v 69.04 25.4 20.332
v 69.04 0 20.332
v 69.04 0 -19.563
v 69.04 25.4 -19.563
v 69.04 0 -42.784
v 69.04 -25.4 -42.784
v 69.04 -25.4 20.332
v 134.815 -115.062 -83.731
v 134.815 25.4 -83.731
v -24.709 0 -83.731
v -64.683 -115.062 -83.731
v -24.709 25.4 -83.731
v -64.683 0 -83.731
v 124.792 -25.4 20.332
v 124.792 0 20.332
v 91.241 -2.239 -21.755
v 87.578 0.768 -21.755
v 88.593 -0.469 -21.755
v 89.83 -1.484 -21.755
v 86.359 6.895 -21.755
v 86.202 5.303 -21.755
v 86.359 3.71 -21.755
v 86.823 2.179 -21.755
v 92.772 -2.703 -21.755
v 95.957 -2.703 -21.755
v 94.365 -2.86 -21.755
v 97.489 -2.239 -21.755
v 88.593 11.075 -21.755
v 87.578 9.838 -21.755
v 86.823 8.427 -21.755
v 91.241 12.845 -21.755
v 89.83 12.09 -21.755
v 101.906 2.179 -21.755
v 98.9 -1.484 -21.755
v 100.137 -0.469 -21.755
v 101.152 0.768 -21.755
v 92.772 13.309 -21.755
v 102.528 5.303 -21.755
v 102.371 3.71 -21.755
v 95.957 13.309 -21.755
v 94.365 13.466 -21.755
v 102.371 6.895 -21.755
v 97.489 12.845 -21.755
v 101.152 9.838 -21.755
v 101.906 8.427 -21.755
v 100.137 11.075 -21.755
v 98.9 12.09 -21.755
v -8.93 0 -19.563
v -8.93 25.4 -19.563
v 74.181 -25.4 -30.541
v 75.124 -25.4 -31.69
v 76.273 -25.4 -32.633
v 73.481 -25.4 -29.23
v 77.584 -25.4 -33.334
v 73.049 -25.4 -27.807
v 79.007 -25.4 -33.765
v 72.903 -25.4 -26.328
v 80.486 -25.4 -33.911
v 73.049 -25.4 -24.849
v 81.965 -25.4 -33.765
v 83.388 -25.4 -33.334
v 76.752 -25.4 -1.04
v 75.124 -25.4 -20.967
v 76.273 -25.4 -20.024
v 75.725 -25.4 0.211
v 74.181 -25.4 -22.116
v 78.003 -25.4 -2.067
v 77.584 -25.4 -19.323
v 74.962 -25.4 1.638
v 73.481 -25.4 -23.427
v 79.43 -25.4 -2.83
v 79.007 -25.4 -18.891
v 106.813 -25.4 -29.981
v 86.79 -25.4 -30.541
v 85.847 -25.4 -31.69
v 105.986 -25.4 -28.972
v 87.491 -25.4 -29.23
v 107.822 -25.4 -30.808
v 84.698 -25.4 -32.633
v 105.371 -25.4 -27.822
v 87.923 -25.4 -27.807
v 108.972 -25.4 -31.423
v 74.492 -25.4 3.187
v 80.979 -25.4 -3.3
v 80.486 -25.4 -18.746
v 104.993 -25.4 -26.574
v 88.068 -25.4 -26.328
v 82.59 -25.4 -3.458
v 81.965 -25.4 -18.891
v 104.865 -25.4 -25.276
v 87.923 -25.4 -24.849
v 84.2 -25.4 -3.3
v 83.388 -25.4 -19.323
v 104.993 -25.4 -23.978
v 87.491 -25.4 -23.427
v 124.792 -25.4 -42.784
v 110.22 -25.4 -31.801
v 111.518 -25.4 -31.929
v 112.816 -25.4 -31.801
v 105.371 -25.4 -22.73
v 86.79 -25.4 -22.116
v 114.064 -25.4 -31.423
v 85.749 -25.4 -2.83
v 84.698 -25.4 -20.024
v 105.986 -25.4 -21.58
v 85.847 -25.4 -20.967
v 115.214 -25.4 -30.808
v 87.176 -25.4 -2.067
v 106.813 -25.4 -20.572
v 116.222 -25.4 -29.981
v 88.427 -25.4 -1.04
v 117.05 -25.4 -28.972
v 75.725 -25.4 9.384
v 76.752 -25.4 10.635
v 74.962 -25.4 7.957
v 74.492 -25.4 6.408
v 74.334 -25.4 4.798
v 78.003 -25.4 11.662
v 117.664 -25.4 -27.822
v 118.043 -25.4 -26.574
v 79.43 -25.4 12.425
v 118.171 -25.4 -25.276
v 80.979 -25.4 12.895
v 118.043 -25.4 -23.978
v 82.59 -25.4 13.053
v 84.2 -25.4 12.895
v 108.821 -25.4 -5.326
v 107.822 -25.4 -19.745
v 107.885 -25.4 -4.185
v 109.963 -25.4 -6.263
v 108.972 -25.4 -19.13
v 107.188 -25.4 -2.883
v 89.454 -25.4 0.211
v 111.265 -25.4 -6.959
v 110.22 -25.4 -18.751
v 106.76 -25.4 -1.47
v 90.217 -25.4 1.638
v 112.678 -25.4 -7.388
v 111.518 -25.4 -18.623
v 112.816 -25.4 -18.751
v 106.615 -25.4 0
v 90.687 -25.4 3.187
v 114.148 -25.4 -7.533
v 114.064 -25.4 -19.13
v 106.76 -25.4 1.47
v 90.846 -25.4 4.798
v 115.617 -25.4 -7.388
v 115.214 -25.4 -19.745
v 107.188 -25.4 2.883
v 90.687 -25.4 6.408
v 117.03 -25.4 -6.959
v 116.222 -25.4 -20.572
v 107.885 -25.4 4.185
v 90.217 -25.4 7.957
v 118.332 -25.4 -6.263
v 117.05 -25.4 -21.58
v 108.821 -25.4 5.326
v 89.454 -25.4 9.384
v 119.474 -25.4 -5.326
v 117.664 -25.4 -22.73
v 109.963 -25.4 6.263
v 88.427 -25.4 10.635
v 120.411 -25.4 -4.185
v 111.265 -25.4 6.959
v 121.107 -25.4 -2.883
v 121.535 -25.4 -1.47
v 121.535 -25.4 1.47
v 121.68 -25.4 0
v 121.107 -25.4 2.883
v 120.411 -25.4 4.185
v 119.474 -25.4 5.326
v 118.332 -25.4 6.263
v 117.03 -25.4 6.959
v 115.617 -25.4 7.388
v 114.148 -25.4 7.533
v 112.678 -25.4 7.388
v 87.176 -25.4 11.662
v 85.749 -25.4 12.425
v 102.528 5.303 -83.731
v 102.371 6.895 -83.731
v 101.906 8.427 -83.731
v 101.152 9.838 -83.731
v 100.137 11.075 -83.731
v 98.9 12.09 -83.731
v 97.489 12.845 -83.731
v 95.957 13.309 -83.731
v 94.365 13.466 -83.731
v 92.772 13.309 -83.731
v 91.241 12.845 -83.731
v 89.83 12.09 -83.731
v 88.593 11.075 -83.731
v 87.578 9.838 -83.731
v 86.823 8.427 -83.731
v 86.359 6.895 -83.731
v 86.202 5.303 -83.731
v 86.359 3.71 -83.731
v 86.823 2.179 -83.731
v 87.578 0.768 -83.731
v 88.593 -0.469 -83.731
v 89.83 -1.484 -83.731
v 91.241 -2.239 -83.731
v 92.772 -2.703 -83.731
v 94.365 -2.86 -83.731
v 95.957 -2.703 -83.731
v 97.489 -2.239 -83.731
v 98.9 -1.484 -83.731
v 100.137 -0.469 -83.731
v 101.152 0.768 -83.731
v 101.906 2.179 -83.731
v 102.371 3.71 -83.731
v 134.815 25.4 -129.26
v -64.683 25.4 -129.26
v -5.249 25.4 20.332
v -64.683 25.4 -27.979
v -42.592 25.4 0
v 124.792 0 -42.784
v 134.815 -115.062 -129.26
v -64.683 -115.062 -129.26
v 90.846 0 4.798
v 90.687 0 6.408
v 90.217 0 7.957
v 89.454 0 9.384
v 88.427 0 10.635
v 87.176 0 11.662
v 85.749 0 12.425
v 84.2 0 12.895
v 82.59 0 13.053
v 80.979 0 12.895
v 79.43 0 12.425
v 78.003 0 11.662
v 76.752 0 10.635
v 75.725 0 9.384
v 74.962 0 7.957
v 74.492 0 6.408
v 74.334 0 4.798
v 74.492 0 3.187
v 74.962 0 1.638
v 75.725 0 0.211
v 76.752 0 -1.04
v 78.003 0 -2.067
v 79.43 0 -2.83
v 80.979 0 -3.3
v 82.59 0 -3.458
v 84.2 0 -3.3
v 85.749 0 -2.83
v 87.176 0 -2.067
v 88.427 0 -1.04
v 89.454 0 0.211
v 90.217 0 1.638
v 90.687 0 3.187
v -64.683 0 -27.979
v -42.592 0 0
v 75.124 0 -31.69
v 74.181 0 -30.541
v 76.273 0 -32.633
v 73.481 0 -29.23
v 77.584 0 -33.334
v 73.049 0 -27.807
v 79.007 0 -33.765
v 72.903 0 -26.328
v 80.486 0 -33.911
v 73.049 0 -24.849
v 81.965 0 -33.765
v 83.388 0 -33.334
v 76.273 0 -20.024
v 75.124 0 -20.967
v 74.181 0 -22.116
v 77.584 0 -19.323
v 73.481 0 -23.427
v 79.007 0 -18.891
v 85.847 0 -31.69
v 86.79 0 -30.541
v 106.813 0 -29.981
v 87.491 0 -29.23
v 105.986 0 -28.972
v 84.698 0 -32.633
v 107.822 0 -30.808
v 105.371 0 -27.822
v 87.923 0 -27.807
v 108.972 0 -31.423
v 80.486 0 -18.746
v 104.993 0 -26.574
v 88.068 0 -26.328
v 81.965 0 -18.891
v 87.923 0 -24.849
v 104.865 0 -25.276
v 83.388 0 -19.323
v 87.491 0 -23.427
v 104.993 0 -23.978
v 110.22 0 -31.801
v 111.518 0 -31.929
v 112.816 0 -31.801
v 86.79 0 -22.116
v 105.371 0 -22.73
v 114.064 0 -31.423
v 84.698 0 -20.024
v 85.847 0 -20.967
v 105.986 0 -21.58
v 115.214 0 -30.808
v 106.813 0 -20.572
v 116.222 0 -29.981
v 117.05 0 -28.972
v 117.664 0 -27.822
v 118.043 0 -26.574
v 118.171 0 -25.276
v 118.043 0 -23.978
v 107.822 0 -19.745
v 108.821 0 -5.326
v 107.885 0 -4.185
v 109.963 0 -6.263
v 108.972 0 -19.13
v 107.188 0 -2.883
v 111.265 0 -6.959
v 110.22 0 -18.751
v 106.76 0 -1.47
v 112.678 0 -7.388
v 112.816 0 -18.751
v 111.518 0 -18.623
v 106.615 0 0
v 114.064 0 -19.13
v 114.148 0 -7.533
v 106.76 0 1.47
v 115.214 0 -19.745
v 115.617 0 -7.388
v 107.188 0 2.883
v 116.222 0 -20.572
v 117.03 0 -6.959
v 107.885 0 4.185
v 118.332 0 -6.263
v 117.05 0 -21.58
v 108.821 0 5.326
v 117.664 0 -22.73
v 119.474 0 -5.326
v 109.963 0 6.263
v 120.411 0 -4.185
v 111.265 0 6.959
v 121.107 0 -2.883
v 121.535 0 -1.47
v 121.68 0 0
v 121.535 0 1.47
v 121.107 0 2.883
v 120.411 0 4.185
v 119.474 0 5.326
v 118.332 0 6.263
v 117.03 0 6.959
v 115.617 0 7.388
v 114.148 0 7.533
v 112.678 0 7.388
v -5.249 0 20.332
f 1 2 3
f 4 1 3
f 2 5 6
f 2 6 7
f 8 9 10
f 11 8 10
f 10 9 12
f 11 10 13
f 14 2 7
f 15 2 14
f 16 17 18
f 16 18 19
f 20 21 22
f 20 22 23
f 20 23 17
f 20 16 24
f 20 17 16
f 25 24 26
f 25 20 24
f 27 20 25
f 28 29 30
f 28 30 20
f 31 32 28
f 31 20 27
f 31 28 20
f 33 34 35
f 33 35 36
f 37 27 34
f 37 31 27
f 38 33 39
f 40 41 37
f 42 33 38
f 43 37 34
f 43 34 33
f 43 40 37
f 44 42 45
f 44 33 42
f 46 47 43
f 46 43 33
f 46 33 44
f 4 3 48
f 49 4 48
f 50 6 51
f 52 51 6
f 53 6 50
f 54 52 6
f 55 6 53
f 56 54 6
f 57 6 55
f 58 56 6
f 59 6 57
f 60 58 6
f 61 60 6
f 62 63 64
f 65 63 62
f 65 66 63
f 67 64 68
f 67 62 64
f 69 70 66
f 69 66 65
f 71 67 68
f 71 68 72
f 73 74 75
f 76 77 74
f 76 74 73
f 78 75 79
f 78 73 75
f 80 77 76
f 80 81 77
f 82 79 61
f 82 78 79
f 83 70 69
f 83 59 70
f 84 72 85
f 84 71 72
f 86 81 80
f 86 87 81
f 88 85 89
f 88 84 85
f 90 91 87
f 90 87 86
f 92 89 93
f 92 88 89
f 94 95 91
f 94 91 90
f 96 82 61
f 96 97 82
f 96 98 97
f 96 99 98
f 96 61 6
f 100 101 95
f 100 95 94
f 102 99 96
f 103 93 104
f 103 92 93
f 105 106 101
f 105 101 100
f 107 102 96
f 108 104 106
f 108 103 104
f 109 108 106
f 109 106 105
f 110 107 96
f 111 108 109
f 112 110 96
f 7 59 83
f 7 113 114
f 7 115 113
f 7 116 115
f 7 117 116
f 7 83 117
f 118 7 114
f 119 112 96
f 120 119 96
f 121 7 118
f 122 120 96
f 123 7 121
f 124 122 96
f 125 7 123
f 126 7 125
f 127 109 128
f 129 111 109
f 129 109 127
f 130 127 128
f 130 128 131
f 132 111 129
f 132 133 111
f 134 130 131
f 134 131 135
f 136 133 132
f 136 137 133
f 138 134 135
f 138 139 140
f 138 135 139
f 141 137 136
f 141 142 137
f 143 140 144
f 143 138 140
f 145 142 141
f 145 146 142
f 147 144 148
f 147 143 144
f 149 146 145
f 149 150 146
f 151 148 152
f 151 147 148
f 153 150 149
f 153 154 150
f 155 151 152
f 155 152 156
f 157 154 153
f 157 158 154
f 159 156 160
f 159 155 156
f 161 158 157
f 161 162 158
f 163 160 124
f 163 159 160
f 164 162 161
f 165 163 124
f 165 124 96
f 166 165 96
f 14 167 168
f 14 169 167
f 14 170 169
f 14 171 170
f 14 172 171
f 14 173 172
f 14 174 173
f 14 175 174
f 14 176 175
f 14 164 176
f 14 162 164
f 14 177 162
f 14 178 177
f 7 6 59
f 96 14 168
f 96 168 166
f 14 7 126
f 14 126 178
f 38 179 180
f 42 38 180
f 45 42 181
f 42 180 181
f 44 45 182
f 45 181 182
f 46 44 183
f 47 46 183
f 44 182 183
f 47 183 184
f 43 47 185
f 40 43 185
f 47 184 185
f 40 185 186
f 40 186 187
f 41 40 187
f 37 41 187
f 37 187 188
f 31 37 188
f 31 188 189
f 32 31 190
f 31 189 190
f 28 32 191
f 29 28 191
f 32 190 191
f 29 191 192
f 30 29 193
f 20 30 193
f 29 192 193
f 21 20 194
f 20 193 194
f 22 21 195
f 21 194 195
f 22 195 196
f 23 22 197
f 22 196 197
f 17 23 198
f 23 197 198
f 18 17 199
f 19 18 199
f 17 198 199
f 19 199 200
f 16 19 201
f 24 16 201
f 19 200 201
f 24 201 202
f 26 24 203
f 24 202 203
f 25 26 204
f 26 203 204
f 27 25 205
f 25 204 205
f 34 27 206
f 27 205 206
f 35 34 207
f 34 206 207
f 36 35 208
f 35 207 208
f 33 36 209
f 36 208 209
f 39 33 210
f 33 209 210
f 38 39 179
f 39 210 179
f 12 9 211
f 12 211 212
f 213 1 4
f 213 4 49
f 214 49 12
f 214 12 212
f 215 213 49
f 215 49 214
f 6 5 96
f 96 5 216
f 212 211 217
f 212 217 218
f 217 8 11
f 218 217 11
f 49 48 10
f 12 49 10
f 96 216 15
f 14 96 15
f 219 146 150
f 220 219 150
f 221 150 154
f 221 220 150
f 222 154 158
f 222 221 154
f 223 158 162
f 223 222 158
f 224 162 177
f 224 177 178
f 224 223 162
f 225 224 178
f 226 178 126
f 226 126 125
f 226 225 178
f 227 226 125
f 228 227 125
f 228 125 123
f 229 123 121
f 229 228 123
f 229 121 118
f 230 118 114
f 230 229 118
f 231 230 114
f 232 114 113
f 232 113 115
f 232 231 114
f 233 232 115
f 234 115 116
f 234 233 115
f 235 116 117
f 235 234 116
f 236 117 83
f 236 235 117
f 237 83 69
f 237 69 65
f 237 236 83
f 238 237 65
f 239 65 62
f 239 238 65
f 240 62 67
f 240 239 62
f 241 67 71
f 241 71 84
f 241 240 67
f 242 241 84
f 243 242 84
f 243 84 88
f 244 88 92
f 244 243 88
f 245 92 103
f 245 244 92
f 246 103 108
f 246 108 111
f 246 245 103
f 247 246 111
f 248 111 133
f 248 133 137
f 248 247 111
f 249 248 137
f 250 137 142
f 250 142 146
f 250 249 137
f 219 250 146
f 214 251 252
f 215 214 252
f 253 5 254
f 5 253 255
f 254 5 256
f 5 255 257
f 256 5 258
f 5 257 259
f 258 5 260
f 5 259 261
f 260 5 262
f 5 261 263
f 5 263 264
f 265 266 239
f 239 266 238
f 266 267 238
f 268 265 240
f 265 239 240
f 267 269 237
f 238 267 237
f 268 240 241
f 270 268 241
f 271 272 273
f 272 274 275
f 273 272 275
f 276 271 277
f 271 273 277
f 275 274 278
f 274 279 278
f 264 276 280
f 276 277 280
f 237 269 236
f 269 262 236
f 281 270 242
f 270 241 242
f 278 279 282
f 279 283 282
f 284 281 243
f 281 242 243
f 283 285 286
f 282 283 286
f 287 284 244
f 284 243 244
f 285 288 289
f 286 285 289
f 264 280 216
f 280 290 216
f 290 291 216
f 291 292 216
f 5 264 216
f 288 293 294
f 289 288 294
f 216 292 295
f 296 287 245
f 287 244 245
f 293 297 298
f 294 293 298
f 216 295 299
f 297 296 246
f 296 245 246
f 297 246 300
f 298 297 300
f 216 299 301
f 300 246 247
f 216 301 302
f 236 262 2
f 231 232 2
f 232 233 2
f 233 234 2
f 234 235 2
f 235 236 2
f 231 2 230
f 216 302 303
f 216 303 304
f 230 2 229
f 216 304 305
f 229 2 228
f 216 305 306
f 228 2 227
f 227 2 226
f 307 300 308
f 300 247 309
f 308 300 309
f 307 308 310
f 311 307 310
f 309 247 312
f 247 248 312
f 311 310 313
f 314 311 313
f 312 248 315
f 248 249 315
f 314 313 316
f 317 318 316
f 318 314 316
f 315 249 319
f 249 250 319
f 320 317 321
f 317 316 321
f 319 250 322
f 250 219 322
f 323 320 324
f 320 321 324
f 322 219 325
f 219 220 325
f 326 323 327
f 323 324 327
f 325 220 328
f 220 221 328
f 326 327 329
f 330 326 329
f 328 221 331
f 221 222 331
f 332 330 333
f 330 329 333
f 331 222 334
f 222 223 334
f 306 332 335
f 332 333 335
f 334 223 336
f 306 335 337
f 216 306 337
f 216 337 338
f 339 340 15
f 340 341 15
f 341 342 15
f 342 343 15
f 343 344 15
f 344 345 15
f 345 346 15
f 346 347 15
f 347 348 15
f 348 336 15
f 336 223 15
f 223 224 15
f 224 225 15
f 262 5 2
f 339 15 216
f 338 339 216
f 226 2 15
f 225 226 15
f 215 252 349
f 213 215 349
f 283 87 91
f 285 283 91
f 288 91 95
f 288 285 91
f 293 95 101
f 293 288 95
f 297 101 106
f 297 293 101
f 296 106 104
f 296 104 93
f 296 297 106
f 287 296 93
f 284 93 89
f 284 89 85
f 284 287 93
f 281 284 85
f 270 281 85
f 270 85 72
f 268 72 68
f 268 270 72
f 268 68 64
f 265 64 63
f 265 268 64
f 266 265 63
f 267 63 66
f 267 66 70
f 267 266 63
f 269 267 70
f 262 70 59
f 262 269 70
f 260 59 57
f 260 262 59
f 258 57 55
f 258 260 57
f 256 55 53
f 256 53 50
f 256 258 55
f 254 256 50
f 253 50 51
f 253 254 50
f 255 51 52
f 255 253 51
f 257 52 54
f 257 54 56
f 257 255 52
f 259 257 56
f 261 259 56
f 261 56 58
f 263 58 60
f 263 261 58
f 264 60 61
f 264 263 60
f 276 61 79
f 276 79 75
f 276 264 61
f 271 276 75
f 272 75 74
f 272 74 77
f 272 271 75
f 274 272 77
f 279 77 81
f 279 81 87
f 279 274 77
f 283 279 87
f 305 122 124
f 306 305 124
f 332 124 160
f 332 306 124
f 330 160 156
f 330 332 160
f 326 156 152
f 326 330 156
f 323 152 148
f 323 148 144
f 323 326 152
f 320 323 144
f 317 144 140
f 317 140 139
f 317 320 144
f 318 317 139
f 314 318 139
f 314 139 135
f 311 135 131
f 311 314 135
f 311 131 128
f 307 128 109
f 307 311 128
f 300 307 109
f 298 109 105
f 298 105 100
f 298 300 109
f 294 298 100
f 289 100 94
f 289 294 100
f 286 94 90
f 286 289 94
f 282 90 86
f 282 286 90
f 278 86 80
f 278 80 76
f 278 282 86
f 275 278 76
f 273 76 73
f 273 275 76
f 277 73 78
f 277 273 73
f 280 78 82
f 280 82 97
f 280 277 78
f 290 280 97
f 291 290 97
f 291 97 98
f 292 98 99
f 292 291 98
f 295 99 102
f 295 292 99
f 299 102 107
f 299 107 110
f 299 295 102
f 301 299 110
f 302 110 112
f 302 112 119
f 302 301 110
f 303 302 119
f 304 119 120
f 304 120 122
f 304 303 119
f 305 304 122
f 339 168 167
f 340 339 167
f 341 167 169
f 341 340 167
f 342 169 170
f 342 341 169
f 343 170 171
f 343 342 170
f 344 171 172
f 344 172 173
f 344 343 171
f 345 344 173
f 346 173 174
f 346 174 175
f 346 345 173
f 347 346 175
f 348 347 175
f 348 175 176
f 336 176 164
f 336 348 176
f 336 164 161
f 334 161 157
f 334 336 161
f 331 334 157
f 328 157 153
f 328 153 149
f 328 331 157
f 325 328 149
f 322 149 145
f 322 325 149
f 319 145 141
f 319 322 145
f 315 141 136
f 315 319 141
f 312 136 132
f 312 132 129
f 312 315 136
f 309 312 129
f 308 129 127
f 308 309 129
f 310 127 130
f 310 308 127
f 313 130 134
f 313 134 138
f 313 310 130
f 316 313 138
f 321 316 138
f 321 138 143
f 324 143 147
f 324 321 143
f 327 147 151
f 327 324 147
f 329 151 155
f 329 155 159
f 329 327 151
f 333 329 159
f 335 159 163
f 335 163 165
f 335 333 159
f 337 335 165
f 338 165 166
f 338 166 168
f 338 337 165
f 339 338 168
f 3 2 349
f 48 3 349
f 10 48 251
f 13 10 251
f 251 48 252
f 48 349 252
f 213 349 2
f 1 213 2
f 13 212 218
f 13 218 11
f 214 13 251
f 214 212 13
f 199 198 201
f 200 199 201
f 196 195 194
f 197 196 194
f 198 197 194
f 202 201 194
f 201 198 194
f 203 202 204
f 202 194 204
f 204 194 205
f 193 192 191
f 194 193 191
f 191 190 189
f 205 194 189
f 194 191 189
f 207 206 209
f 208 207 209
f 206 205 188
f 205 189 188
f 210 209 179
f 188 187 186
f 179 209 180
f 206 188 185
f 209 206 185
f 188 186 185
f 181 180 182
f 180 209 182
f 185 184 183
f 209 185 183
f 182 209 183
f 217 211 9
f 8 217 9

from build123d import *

# Parameters (mm, degrees)
F0_W     = 55.7522624731
F0_H     = 63.1157644093
F0_R     = 7.5824980314
F0_R_2   = 6.6529863156
F0_R_3   = 8.2558617759
F0_R_4   = 7.5325242752
F1_DEPTH = 25.4
F3_DEPTH = 25.4
F4_W     = 199.4978636503
F4_H     = 45.5293208361
F5_DEPTH = 140.462
F6_R     = 8.1629746205
F7_DEPTH = 61.976


with BuildPart() as f1:
    # F0 (on Front) → F1 (new body)
    with BuildSketch(Plane.XZ):
        with Locations((96.9158560038, -11.2258847803)):
            Rectangle(F0_W, F0_H)
        with Locations((80.4858505726, -26.3282060623)):
            Circle(F0_R, mode=Mode.SUBTRACT)
        with Locations((111.5177720785, -25.2762753516)):
            Circle(F0_R_2, mode=Mode.SUBTRACT)
        with Locations((82.5897082686, 4.7975406051)):
            Circle(F0_R_3, mode=Mode.SUBTRACT)
        with Locations((114.1475960612, 0)):
            Circle(F0_R_4, mode=Mode.SUBTRACT)
    extrude(amount=F1_DEPTH)


with BuildPart() as f3:
    # F2 (on face) → F3 (new body)
    with BuildSketch(Plane(origin=(0, 0, 0), x_dir=(-1, 0, 0), z_dir=(0, 1, 0))):
        Polygon((5.248578731, 20.3319974244), (-69.0397247672, 20.3319974244), (-69.0397247672, -19.5631086826), (8.9303385466, -19.5631086826), (24.7092694044, -83.73080194), (64.6826028824, -83.73080194), (64.6826028824, -67.9518580437), (64.6826028824, -27.9785450548), (42.5920821726, 0), align=None)
    extrude(amount=F3_DEPTH)

    # F4 (on face) → F5 (join)
    with BuildSketch(Plane(origin=(0, 25.4, 0), x_dir=(-1, 0, 0), z_dir=(0, 1, 0))):
        with Locations((-35.0663289428, -106.495462358)):
            Rectangle(F4_W, F4_H)
    extrude(amount=-F5_DEPTH)


with BuildPart() as f7:
    # F6 (on face) → F7 (new body)
    with BuildSketch(Plane.XY.offset(-83.73080194)):
        with Locations((94.3648293614, 5.3029819392)):
            Circle(F6_R)
    extrude(amount=F7_DEPTH)


solid = Compound([f1.part, f3.part, f7.part])
